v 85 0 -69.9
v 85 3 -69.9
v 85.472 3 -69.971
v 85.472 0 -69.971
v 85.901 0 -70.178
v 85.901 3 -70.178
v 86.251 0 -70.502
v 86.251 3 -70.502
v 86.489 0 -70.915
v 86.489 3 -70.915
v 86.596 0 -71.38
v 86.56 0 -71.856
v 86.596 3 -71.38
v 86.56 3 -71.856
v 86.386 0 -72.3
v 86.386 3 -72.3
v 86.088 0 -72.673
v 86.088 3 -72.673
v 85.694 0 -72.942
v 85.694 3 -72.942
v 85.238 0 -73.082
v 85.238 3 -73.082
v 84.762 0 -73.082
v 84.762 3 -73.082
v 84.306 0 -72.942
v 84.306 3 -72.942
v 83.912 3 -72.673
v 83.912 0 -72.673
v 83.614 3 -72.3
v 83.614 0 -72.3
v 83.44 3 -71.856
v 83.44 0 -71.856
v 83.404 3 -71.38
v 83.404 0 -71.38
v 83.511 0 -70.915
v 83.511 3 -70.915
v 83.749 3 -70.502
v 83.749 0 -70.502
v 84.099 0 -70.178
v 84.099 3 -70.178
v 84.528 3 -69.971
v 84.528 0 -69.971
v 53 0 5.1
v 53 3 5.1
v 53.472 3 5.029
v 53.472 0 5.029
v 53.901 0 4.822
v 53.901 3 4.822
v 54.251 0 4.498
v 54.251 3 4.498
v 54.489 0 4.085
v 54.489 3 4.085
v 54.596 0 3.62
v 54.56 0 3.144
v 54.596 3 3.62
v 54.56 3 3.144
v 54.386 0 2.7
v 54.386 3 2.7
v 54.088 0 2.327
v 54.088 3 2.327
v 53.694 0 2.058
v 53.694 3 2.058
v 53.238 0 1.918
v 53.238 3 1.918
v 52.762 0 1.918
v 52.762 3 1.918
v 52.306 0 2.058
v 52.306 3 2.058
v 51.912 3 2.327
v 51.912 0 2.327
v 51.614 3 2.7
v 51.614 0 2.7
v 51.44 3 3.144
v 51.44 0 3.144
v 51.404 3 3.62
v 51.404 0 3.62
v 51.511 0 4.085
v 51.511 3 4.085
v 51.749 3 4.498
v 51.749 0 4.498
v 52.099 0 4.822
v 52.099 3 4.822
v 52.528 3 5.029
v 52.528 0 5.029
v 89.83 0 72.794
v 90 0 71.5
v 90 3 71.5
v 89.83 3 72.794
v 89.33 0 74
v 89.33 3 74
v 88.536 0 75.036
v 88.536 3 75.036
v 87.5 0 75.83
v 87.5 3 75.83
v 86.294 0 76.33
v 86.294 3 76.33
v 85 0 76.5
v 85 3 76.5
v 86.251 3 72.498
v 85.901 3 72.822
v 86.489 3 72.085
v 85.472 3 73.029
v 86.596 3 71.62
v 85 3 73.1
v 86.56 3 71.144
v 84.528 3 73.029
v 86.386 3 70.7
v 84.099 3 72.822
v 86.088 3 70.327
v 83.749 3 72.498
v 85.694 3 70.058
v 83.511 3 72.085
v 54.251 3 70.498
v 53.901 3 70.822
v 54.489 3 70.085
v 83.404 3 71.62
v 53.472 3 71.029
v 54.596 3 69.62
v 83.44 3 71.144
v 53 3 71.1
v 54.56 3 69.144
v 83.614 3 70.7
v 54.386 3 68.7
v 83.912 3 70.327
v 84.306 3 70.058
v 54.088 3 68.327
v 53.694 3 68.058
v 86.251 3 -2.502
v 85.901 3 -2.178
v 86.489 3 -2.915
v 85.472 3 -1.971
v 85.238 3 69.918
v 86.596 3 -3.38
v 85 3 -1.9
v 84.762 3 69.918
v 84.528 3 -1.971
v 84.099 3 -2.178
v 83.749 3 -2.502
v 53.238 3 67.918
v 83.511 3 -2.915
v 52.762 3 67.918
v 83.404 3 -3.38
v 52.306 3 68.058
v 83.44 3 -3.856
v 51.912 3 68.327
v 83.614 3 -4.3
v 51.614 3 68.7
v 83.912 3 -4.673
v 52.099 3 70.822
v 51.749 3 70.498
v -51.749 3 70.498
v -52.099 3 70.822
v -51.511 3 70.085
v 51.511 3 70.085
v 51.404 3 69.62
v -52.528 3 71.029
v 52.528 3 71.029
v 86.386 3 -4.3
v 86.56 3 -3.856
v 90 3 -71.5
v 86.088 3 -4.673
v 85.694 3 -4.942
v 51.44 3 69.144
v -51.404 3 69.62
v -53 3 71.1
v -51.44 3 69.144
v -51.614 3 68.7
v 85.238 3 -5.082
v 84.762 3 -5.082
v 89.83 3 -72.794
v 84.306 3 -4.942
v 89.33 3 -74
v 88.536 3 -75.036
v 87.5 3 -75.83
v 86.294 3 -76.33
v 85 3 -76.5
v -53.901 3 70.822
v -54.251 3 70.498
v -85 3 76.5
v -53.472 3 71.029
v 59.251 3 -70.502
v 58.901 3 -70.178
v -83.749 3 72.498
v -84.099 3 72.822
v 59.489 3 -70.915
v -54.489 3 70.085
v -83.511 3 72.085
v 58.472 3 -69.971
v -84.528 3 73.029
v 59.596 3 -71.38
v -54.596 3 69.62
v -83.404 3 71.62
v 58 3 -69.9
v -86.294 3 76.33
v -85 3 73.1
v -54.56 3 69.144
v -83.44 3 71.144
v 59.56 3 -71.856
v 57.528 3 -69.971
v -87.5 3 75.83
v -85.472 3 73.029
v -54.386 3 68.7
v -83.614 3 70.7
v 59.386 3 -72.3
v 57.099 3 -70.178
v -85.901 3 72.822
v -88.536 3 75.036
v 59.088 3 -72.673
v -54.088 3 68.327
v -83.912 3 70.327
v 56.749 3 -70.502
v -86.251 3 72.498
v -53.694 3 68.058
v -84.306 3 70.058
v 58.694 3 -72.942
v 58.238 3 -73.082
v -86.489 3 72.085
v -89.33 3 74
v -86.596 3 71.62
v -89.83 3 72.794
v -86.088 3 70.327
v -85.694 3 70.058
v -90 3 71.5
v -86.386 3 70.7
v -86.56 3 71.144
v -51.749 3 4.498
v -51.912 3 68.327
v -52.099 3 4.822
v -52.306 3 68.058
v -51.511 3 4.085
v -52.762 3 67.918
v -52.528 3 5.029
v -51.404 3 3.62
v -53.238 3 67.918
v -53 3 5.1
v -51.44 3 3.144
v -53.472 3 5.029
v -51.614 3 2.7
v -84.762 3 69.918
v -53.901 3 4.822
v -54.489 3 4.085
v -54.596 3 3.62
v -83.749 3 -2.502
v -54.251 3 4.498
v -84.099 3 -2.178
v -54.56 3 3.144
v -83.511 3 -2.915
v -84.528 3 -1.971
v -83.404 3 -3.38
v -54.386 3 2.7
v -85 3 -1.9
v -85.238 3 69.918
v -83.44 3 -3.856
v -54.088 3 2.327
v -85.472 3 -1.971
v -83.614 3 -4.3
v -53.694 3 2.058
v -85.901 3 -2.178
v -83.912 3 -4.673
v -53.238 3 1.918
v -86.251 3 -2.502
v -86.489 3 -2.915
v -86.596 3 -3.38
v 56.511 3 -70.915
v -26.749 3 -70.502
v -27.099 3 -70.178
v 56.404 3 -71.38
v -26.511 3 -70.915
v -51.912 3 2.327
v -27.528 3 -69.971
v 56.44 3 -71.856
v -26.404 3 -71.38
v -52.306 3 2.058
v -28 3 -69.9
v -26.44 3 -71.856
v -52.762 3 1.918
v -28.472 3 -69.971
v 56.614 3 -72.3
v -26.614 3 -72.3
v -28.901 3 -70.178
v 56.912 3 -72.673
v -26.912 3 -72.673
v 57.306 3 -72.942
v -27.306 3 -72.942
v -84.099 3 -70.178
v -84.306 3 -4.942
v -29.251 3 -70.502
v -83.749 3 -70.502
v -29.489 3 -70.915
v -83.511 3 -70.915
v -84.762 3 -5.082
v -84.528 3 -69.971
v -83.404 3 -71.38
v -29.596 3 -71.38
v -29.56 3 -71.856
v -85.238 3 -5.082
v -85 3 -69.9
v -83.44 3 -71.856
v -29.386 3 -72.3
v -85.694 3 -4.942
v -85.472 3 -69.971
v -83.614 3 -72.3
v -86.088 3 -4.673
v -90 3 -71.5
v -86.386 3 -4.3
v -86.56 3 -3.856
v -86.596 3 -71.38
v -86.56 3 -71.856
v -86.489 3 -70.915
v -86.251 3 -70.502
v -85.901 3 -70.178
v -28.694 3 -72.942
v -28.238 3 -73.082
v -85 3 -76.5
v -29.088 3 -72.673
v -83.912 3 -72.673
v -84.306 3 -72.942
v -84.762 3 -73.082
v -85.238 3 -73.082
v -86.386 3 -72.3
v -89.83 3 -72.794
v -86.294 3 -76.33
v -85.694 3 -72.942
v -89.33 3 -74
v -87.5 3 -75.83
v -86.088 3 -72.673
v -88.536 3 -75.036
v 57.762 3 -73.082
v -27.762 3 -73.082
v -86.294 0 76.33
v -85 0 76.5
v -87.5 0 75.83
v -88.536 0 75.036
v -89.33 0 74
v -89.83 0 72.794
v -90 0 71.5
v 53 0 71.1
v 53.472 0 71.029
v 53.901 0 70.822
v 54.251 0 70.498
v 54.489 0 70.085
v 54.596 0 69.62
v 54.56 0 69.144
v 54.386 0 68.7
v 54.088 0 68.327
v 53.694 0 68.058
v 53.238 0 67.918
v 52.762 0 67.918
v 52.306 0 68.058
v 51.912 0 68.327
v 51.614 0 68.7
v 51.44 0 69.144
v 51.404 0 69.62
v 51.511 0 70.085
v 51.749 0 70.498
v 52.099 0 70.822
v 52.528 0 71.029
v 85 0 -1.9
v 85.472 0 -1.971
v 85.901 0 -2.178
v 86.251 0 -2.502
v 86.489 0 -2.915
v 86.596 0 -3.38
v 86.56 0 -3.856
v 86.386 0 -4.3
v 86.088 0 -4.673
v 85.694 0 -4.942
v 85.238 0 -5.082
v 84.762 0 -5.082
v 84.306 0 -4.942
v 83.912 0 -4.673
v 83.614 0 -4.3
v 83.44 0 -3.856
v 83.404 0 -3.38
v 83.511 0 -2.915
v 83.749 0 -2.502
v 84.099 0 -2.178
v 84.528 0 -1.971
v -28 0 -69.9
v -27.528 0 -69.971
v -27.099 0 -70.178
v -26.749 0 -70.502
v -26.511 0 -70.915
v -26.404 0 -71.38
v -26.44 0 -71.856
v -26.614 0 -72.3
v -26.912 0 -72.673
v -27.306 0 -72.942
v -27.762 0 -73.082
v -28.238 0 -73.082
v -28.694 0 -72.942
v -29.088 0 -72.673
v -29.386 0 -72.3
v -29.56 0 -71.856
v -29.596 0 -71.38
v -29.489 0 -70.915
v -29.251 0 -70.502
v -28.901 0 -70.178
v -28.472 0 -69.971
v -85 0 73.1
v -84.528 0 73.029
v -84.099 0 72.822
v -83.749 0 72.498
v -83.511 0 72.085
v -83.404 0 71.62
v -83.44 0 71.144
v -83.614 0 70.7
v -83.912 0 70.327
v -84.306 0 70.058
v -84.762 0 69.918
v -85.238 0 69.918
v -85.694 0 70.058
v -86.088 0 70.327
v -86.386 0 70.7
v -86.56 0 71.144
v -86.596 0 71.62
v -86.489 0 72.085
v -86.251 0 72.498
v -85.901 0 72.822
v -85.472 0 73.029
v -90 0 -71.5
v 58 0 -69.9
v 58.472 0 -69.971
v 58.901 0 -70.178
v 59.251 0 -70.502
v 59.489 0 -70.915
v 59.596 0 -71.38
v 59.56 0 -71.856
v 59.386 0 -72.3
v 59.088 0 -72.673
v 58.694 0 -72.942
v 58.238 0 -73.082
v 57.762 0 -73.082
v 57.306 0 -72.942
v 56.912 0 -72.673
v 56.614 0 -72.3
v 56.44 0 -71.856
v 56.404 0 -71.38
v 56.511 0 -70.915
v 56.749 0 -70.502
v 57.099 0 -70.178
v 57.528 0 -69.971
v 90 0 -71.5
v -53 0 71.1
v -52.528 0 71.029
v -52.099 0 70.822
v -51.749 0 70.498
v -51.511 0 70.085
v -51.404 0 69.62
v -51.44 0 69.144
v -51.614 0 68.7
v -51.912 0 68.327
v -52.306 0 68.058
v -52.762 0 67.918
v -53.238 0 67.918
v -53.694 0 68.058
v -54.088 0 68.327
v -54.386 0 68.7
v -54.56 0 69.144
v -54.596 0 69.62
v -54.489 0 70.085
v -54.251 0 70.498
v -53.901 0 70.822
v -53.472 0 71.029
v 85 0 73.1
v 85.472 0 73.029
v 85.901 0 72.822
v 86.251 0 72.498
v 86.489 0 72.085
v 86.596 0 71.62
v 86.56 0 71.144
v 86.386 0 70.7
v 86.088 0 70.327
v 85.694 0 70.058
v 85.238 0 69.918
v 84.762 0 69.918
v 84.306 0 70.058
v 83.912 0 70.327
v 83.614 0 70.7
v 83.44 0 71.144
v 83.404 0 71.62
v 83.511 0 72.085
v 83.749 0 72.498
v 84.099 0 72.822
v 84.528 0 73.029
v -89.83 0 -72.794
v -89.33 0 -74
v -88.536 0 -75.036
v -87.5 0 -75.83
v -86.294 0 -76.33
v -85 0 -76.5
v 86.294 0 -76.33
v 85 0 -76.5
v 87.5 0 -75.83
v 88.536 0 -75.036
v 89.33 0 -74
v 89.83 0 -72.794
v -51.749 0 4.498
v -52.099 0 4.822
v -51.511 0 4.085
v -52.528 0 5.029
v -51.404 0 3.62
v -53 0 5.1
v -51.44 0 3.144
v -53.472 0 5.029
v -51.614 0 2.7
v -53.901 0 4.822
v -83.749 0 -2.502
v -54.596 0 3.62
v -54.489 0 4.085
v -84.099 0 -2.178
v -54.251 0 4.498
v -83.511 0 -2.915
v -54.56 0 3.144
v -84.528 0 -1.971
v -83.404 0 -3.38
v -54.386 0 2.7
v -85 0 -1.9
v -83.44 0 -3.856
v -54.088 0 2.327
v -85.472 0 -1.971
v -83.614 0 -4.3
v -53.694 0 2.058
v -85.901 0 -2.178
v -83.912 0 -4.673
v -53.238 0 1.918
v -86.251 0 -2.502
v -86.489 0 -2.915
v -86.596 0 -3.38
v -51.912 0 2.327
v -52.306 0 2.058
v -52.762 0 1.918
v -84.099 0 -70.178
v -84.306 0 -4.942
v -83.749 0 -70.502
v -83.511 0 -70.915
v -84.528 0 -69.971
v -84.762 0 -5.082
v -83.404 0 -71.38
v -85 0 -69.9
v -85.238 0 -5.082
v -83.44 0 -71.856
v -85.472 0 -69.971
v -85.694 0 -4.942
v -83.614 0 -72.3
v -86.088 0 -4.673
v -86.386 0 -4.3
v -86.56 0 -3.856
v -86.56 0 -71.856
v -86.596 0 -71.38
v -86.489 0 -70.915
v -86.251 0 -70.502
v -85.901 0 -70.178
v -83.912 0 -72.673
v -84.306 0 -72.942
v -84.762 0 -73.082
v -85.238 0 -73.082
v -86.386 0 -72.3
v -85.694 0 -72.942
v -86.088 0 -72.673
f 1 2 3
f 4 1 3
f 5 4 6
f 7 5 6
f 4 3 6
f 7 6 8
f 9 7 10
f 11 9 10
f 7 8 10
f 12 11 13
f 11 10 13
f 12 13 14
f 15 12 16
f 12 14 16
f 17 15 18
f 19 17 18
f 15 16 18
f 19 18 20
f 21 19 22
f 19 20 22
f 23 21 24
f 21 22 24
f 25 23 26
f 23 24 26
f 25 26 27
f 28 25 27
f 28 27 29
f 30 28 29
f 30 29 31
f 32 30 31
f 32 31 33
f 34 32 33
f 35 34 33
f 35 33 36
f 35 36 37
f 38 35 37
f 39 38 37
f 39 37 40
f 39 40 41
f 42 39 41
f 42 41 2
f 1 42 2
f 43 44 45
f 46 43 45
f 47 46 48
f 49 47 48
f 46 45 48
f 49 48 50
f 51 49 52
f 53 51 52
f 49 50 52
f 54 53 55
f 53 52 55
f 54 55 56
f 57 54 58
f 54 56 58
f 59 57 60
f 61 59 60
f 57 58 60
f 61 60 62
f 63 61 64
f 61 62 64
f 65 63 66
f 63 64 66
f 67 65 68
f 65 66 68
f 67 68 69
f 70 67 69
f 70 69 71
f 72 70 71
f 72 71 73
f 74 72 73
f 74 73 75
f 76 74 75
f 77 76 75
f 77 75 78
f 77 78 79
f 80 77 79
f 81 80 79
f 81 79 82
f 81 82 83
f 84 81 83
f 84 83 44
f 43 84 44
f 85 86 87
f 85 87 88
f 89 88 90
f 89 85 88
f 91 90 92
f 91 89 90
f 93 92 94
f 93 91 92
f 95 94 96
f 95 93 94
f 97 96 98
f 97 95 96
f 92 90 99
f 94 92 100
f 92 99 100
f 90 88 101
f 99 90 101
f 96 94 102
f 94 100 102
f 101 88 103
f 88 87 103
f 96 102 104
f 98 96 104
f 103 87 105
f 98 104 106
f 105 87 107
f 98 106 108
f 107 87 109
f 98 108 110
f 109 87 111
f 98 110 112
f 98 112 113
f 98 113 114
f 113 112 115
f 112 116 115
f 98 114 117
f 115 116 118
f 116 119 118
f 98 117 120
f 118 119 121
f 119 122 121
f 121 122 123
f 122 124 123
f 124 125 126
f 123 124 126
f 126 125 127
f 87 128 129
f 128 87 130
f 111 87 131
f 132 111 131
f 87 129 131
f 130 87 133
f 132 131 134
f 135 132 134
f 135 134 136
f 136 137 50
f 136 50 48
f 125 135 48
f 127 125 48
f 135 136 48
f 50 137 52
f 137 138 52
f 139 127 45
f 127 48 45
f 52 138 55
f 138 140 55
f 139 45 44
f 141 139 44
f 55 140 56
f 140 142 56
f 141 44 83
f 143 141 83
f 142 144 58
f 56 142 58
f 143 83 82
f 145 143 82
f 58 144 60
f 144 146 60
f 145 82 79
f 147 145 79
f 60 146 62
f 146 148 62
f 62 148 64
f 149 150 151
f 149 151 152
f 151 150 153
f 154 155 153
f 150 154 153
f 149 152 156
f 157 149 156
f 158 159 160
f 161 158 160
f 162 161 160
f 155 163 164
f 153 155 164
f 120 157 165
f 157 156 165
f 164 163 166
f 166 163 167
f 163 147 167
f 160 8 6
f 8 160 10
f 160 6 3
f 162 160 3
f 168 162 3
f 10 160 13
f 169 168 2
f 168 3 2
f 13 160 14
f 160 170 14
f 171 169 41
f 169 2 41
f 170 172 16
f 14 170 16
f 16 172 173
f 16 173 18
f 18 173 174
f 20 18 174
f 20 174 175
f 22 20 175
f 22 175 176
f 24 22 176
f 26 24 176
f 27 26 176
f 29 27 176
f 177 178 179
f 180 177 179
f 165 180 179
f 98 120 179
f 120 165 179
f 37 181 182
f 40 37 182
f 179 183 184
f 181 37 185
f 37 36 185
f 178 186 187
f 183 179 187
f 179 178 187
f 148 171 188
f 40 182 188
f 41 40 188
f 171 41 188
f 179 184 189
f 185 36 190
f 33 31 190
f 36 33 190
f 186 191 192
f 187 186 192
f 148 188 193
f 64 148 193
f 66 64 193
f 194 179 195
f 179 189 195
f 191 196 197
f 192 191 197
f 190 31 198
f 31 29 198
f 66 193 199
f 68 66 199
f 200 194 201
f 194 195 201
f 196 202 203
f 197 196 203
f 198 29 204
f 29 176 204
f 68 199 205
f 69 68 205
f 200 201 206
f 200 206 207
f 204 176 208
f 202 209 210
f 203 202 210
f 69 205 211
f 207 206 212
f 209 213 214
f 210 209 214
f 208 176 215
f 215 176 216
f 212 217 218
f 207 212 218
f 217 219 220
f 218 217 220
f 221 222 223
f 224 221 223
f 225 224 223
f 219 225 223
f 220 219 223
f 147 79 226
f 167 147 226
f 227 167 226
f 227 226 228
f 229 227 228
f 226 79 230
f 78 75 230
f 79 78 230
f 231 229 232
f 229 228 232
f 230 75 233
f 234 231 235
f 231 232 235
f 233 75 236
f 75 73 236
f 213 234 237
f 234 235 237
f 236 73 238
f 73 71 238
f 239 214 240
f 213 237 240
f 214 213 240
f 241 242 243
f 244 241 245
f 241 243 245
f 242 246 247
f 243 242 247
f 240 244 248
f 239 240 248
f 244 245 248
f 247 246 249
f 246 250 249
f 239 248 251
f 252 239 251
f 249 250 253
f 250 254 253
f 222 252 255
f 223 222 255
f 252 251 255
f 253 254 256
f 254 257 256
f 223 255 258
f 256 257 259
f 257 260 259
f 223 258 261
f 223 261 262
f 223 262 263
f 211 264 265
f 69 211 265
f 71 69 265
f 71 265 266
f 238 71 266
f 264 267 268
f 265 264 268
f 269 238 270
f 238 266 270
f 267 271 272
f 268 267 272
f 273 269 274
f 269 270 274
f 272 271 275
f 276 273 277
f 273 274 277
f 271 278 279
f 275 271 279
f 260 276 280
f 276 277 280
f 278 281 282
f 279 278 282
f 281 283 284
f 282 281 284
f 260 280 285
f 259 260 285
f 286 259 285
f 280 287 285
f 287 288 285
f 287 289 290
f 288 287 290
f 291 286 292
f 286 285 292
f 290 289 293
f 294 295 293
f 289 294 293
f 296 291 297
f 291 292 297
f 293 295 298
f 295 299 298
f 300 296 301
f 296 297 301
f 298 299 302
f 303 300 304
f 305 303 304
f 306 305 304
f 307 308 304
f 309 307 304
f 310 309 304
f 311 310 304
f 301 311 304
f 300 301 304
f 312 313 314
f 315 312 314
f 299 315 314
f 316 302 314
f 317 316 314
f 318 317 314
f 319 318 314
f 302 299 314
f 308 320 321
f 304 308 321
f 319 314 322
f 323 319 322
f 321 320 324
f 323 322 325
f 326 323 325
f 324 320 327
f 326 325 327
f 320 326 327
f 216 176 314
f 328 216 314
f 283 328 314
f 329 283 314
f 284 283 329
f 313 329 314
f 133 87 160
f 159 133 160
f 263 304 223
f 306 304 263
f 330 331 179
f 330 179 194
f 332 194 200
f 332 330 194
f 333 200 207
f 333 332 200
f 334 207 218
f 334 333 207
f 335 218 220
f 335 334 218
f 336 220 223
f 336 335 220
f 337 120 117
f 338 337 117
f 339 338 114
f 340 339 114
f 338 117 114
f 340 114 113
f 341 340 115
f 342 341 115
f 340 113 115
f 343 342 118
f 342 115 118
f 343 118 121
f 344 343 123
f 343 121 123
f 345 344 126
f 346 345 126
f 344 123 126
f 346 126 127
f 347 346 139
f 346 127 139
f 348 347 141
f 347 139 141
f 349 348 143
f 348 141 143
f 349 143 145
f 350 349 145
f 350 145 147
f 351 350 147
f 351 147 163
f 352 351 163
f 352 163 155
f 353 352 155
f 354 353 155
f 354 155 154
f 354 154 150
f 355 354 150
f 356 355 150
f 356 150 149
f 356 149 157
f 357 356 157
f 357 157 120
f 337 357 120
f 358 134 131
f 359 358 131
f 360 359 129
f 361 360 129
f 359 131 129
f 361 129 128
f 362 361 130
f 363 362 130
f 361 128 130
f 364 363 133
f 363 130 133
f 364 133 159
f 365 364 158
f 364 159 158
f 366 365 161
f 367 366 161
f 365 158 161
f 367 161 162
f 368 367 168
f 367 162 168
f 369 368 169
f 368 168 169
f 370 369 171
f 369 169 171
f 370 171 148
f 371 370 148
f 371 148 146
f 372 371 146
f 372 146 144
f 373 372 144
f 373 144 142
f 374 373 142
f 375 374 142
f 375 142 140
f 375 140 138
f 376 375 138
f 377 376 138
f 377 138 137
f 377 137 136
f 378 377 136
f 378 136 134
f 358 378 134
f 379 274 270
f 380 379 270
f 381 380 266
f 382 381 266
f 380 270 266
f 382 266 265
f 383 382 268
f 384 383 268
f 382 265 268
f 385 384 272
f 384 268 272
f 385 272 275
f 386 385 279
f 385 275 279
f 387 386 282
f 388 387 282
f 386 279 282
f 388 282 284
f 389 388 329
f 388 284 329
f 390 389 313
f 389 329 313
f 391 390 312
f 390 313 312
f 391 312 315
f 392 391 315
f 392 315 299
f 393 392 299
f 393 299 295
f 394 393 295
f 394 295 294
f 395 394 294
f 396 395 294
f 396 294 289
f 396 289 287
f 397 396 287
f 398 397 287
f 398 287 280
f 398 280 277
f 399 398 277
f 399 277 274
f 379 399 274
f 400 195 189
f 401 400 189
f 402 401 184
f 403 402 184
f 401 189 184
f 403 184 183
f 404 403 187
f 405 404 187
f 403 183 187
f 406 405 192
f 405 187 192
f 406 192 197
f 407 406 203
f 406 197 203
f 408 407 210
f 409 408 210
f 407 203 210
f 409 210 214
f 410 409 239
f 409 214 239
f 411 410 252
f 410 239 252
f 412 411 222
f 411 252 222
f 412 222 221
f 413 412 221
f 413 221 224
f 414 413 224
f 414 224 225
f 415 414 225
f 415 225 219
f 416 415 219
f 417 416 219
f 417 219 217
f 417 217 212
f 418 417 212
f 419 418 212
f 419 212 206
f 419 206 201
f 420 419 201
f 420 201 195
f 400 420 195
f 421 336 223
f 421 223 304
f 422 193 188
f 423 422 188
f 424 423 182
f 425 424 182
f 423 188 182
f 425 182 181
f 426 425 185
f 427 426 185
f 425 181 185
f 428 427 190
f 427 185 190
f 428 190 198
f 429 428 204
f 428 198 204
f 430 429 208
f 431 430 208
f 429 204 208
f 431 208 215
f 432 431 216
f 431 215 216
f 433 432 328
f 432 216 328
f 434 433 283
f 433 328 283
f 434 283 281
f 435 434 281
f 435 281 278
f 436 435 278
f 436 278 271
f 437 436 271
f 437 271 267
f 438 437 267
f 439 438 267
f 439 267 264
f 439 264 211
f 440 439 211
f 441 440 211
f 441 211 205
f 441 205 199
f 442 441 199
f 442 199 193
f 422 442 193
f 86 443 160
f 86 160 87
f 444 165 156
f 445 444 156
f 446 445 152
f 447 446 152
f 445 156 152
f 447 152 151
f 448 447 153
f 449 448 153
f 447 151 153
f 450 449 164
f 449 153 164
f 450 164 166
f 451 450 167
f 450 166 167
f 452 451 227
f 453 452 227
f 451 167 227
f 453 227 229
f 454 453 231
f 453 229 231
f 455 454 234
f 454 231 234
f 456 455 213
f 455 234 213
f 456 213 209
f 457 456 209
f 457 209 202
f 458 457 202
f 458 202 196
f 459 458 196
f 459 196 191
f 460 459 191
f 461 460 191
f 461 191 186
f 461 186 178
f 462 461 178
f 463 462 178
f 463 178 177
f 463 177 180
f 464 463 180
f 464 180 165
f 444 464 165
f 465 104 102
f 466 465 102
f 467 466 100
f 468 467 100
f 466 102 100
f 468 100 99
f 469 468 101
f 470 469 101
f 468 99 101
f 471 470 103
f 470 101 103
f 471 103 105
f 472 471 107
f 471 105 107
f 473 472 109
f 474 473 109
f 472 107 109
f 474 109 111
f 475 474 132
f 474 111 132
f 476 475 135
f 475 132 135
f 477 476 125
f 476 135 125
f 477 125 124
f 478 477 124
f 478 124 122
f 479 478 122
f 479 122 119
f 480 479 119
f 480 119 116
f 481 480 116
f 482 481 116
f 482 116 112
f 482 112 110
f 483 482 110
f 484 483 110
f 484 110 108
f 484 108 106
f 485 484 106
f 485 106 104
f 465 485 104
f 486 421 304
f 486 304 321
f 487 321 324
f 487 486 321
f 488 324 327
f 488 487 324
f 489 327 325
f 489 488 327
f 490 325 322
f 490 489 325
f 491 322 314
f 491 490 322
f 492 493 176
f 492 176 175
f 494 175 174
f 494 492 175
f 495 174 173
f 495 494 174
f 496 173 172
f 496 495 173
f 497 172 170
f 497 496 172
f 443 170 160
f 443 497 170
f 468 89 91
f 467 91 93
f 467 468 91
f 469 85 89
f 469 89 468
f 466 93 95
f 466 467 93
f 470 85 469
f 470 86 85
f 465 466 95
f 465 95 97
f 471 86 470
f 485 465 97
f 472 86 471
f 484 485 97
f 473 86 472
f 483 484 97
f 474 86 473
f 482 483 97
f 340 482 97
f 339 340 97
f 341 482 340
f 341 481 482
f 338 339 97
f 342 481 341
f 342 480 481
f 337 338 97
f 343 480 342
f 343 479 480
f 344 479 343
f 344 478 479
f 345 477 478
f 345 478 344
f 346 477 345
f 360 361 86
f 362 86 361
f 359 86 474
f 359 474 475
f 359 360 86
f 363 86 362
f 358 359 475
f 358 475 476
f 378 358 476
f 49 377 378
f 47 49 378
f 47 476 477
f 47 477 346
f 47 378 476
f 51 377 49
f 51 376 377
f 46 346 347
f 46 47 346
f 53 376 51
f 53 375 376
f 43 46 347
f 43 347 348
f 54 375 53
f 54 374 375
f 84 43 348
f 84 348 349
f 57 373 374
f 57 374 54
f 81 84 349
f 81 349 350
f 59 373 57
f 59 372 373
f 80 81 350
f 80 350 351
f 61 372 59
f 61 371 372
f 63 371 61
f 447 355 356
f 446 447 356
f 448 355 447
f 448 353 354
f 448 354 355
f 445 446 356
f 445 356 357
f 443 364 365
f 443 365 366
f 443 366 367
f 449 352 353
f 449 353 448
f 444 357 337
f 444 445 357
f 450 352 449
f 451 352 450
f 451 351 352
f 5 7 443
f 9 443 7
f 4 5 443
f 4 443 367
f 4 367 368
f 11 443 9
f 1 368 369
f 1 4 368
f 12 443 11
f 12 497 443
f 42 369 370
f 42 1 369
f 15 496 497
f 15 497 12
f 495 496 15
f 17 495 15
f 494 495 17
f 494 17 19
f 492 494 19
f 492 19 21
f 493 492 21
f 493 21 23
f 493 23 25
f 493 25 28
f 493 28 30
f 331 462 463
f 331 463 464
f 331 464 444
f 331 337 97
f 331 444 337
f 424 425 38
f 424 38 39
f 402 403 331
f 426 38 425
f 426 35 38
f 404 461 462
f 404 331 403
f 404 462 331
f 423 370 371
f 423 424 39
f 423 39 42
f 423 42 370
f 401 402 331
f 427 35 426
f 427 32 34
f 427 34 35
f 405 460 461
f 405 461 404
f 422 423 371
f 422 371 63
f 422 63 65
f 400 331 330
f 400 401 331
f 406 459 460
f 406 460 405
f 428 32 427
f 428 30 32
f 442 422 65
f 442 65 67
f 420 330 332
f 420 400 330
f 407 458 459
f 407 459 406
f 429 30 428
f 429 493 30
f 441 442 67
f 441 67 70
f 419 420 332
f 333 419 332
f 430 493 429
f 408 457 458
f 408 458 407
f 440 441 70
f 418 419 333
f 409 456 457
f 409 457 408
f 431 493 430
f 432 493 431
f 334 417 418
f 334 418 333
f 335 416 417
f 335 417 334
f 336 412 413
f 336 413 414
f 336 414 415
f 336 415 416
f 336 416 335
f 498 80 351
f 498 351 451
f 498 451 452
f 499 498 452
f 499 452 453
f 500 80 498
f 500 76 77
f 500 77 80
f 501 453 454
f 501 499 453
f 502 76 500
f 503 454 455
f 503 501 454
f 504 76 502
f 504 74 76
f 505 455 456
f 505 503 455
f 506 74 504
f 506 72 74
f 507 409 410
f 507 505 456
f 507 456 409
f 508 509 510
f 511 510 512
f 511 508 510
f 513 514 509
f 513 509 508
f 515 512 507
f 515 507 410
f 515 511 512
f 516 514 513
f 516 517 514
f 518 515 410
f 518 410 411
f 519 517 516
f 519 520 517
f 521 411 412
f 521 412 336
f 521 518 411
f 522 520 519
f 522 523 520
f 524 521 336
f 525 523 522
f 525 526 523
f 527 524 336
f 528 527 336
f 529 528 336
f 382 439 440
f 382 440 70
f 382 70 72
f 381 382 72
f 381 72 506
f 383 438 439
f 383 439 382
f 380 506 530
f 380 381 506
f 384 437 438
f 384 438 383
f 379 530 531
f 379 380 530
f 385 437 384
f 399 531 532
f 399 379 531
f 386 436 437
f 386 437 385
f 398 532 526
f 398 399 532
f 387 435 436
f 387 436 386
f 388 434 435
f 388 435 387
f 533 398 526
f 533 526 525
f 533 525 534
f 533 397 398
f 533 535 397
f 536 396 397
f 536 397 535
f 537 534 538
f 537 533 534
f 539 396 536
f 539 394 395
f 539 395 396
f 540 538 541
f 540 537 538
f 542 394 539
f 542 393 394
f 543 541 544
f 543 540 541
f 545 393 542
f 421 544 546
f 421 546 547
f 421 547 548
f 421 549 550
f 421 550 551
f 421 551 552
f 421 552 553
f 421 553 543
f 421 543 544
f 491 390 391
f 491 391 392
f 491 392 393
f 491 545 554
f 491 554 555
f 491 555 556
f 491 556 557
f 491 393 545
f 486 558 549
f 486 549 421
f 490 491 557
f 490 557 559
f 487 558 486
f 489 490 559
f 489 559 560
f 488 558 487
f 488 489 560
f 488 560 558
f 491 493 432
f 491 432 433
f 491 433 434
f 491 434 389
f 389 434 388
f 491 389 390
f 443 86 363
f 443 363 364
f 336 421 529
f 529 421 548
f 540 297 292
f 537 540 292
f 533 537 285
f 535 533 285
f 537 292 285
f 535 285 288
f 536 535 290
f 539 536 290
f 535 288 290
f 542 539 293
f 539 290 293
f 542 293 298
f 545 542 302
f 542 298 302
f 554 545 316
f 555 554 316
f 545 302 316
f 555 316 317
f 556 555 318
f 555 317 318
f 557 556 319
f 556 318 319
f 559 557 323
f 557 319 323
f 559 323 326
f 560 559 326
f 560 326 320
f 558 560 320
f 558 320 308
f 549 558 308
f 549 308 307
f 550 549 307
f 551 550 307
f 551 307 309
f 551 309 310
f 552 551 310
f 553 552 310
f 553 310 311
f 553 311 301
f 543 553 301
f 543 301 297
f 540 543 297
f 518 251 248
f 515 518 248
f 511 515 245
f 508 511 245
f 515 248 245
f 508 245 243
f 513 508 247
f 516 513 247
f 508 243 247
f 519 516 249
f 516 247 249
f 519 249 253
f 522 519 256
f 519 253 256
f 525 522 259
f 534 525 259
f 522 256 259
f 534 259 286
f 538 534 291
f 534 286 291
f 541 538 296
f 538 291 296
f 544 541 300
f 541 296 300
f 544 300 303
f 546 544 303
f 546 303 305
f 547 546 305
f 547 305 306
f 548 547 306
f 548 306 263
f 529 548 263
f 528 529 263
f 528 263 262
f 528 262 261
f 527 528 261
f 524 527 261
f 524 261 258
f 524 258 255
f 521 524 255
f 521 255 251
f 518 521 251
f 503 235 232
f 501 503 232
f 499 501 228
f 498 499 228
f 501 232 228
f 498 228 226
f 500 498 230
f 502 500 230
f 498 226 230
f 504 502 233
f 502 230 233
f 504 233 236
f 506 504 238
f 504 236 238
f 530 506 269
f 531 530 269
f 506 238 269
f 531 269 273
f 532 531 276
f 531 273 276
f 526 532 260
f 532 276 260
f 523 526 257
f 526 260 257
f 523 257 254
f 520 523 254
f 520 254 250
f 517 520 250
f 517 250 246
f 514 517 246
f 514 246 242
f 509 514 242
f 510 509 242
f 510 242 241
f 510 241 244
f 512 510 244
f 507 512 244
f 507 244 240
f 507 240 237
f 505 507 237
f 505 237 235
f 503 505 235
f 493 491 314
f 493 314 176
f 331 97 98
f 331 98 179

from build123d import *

# Parameters (mm, degrees)
EXTRUDE_1_DEPTH     = 3
CUT_EXTRUDE_1_REACH = 120.158
SKETCH_2_R          = 1.6


with BuildPart() as part:
    # 草图1 → 凸台-拉伸1 (new body)
    with BuildSketch(Plane(origin=(0, 0, 0), x_dir=(1, 0, 0), z_dir=(0, 1, 0))):
        with BuildLine():
            Line((-85, 76.5), (85, 76.5))
            ThreePointArc((85, 76.5), (88.535533906, 75.035533906), (90, 71.5))
            Line((90, 71.5), (90, -71.5))
            ThreePointArc((90, -71.5), (88.535533906, -75.035533906), (85, -76.5))
            Line((85, -76.5), (-85, -76.5))
            ThreePointArc((-85, -76.5), (-88.535533906, -75.035533906), (-90, -71.5))
            Line((-90, -71.5), (-90, 71.5))
            ThreePointArc((-90, 71.5), (-88.535533906, 75.035533906), (-85, 76.5))
        make_face()
    extrude(amount=EXTRUDE_1_DEPTH)

    # 草图2 → 切除-拉伸1 (cut, up to next)
    with BuildSketch(Plane(origin=(0, 3, 0), x_dir=(1, 0, 0), z_dir=(0, 1, 0)), mode=Mode.PRIVATE) as cut_extrude_1_sk1:
        with Locations(Location((-85, 71.5, 0), (0, 0, 270))):
            Circle(SKETCH_2_R)
    cut_extrude_1_tool1 = extrude(cut_extrude_1_sk1.sketch, amount=-CUT_EXTRUDE_1_REACH, mode=Mode.PRIVATE) & part.part
    # 草图2 → 切除-拉伸1 (cut, up to next)
    with BuildSketch(Plane(origin=(0, 3, 0), x_dir=(1, 0, 0), z_dir=(0, 1, 0)), mode=Mode.PRIVATE) as cut_extrude_1_sk2:
        with Locations(Location((85, 71.5, 0), (0, 0, 270))):
            Circle(SKETCH_2_R)
    cut_extrude_1_tool2 = extrude(cut_extrude_1_sk2.sketch, amount=-CUT_EXTRUDE_1_REACH, mode=Mode.PRIVATE) & part.part
    # 草图2 → 切除-拉伸1 (cut, up to next)
    with BuildSketch(Plane(origin=(0, 3, 0), x_dir=(1, 0, 0), z_dir=(0, 1, 0)), mode=Mode.PRIVATE) as cut_extrude_1_sk3:
        with Locations(Location((85, -71.5, 0), (0, 0, 270))):
            Circle(SKETCH_2_R)
    cut_extrude_1_tool3 = extrude(cut_extrude_1_sk3.sketch, amount=-CUT_EXTRUDE_1_REACH, mode=Mode.PRIVATE) & part.part
    # 草图2 → 切除-拉伸1 (cut, up to next)
    with BuildSketch(Plane(origin=(0, 3, 0), x_dir=(1, 0, 0), z_dir=(0, 1, 0)), mode=Mode.PRIVATE) as cut_extrude_1_sk4:
        with Locations(Location((-85, -71.5, 0), (0, 0, 270))):
            Circle(SKETCH_2_R)
    cut_extrude_1_tool4 = extrude(cut_extrude_1_sk4.sketch, amount=-CUT_EXTRUDE_1_REACH, mode=Mode.PRIVATE) & part.part
    # 草图2 → 切除-拉伸1 (cut, up to next)
    with BuildSketch(Plane(origin=(0, 3, 0), x_dir=(1, 0, 0), z_dir=(0, 1, 0)), mode=Mode.PRIVATE) as cut_extrude_1_sk5:
        with Locations(Location((-53, -69.5, 0), (0, 0, 270))):
            Circle(SKETCH_2_R)
    cut_extrude_1_tool5 = extrude(cut_extrude_1_sk5.sketch, amount=-CUT_EXTRUDE_1_REACH, mode=Mode.PRIVATE) & part.part
    # 草图2 → 切除-拉伸1 (cut, up to next)
    with BuildSketch(Plane(origin=(0, 3, 0), x_dir=(1, 0, 0), z_dir=(0, 1, 0)), mode=Mode.PRIVATE) as cut_extrude_1_sk6:
        with Locations(Location((53, -69.5, 0), (0, 0, 270))):
            Circle(SKETCH_2_R)
    cut_extrude_1_tool6 = extrude(cut_extrude_1_sk6.sketch, amount=-CUT_EXTRUDE_1_REACH, mode=Mode.PRIVATE) & part.part
    # 草图2 → 切除-拉伸1 (cut, up to next)
    with BuildSketch(Plane(origin=(0, 3, 0), x_dir=(1, 0, 0), z_dir=(0, 1, 0)), mode=Mode.PRIVATE) as cut_extrude_1_sk7:
        with Locations(Location((53, -3.5, 0), (0, 0, 270))):
            Circle(SKETCH_2_R)
    cut_extrude_1_tool7 = extrude(cut_extrude_1_sk7.sketch, amount=-CUT_EXTRUDE_1_REACH, mode=Mode.PRIVATE) & part.part
    # 草图2 → 切除-拉伸1 (cut, up to next)
    with BuildSketch(Plane(origin=(0, 3, 0), x_dir=(1, 0, 0), z_dir=(0, 1, 0)), mode=Mode.PRIVATE) as cut_extrude_1_sk8:
        with Locations(Location((-53, -3.5, 0), (0, 0, 270))):
            Circle(SKETCH_2_R)
    cut_extrude_1_tool8 = extrude(cut_extrude_1_sk8.sketch, amount=-CUT_EXTRUDE_1_REACH, mode=Mode.PRIVATE) & part.part
    # 草图2 → 切除-拉伸1 (cut, up to next)
    with BuildSketch(Plane(origin=(0, 3, 0), x_dir=(1, 0, 0), z_dir=(0, 1, 0)), mode=Mode.PRIVATE) as cut_extrude_1_sk9:
        with Locations(Location((-28, 71.5, 0), (0, 0, 270))):
            Circle(SKETCH_2_R)
    cut_extrude_1_tool9 = extrude(cut_extrude_1_sk9.sketch, amount=-CUT_EXTRUDE_1_REACH, mode=Mode.PRIVATE) & part.part
    # 草图2 → 切除-拉伸1 (cut, up to next)
    with BuildSketch(Plane(origin=(0, 3, 0), x_dir=(1, 0, 0), z_dir=(0, 1, 0)), mode=Mode.PRIVATE) as cut_extrude_1_sk10:
        with Locations(Location((58, 71.5, 0), (0, 0, 270))):
            Circle(SKETCH_2_R)
    cut_extrude_1_tool10 = extrude(cut_extrude_1_sk10.sketch, amount=-CUT_EXTRUDE_1_REACH, mode=Mode.PRIVATE) & part.part
    # 草图2 → 切除-拉伸1 (cut, up to next)
    with BuildSketch(Plane(origin=(0, 3, 0), x_dir=(1, 0, 0), z_dir=(0, 1, 0)), mode=Mode.PRIVATE) as cut_extrude_1_sk11:
        with Locations(Location((-85, 3.5, 0), (0, 0, 270))):
            Circle(SKETCH_2_R)
    cut_extrude_1_tool11 = extrude(cut_extrude_1_sk11.sketch, amount=-CUT_EXTRUDE_1_REACH, mode=Mode.PRIVATE) & part.part
    # 草图2 → 切除-拉伸1 (cut, up to next)
    with BuildSketch(Plane(origin=(0, 3, 0), x_dir=(1, 0, 0), z_dir=(0, 1, 0)), mode=Mode.PRIVATE) as cut_extrude_1_sk12:
        with Locations(Location((85, 3.5, 0), (0, 0, 270))):
            Circle(SKETCH_2_R)
    cut_extrude_1_tool12 = extrude(cut_extrude_1_sk12.sketch, amount=-CUT_EXTRUDE_1_REACH, mode=Mode.PRIVATE) & part.part
    add(cut_extrude_1_tool1.solids().sort_by_distance((-85, 3, -71.5))[0], mode=Mode.SUBTRACT)
    add(cut_extrude_1_tool2.solids().sort_by_distance((85, 3, -71.5))[0], mode=Mode.SUBTRACT)
    add(cut_extrude_1_tool3.solids().sort_by_distance((85, 3, 71.5))[0], mode=Mode.SUBTRACT)
    add(cut_extrude_1_tool4.solids().sort_by_distance((-85, 3, 71.5))[0], mode=Mode.SUBTRACT)
    add(cut_extrude_1_tool5.solids().sort_by_distance((-53, 3, 69.5))[0], mode=Mode.SUBTRACT)
    add(cut_extrude_1_tool6.solids().sort_by_distance((53, 3, 69.5))[0], mode=Mode.SUBTRACT)
    add(cut_extrude_1_tool7.solids().sort_by_distance((53, 3, 3.5))[0], mode=Mode.SUBTRACT)
    add(cut_extrude_1_tool8.solids().sort_by_distance((-53, 3, 3.5))[0], mode=Mode.SUBTRACT)
    add(cut_extrude_1_tool9.solids().sort_by_distance((-28, 3, -71.5))[0], mode=Mode.SUBTRACT)
    add(cut_extrude_1_tool10.solids().sort_by_distance((58, 3, -71.5))[0], mode=Mode.SUBTRACT)
    add(cut_extrude_1_tool11.solids().sort_by_distance((-85, 3, -3.5))[0], mode=Mode.SUBTRACT)
    add(cut_extrude_1_tool12.solids().sort_by_distance((85, 3, -3.5))[0], mode=Mode.SUBTRACT)


solid = part.part
